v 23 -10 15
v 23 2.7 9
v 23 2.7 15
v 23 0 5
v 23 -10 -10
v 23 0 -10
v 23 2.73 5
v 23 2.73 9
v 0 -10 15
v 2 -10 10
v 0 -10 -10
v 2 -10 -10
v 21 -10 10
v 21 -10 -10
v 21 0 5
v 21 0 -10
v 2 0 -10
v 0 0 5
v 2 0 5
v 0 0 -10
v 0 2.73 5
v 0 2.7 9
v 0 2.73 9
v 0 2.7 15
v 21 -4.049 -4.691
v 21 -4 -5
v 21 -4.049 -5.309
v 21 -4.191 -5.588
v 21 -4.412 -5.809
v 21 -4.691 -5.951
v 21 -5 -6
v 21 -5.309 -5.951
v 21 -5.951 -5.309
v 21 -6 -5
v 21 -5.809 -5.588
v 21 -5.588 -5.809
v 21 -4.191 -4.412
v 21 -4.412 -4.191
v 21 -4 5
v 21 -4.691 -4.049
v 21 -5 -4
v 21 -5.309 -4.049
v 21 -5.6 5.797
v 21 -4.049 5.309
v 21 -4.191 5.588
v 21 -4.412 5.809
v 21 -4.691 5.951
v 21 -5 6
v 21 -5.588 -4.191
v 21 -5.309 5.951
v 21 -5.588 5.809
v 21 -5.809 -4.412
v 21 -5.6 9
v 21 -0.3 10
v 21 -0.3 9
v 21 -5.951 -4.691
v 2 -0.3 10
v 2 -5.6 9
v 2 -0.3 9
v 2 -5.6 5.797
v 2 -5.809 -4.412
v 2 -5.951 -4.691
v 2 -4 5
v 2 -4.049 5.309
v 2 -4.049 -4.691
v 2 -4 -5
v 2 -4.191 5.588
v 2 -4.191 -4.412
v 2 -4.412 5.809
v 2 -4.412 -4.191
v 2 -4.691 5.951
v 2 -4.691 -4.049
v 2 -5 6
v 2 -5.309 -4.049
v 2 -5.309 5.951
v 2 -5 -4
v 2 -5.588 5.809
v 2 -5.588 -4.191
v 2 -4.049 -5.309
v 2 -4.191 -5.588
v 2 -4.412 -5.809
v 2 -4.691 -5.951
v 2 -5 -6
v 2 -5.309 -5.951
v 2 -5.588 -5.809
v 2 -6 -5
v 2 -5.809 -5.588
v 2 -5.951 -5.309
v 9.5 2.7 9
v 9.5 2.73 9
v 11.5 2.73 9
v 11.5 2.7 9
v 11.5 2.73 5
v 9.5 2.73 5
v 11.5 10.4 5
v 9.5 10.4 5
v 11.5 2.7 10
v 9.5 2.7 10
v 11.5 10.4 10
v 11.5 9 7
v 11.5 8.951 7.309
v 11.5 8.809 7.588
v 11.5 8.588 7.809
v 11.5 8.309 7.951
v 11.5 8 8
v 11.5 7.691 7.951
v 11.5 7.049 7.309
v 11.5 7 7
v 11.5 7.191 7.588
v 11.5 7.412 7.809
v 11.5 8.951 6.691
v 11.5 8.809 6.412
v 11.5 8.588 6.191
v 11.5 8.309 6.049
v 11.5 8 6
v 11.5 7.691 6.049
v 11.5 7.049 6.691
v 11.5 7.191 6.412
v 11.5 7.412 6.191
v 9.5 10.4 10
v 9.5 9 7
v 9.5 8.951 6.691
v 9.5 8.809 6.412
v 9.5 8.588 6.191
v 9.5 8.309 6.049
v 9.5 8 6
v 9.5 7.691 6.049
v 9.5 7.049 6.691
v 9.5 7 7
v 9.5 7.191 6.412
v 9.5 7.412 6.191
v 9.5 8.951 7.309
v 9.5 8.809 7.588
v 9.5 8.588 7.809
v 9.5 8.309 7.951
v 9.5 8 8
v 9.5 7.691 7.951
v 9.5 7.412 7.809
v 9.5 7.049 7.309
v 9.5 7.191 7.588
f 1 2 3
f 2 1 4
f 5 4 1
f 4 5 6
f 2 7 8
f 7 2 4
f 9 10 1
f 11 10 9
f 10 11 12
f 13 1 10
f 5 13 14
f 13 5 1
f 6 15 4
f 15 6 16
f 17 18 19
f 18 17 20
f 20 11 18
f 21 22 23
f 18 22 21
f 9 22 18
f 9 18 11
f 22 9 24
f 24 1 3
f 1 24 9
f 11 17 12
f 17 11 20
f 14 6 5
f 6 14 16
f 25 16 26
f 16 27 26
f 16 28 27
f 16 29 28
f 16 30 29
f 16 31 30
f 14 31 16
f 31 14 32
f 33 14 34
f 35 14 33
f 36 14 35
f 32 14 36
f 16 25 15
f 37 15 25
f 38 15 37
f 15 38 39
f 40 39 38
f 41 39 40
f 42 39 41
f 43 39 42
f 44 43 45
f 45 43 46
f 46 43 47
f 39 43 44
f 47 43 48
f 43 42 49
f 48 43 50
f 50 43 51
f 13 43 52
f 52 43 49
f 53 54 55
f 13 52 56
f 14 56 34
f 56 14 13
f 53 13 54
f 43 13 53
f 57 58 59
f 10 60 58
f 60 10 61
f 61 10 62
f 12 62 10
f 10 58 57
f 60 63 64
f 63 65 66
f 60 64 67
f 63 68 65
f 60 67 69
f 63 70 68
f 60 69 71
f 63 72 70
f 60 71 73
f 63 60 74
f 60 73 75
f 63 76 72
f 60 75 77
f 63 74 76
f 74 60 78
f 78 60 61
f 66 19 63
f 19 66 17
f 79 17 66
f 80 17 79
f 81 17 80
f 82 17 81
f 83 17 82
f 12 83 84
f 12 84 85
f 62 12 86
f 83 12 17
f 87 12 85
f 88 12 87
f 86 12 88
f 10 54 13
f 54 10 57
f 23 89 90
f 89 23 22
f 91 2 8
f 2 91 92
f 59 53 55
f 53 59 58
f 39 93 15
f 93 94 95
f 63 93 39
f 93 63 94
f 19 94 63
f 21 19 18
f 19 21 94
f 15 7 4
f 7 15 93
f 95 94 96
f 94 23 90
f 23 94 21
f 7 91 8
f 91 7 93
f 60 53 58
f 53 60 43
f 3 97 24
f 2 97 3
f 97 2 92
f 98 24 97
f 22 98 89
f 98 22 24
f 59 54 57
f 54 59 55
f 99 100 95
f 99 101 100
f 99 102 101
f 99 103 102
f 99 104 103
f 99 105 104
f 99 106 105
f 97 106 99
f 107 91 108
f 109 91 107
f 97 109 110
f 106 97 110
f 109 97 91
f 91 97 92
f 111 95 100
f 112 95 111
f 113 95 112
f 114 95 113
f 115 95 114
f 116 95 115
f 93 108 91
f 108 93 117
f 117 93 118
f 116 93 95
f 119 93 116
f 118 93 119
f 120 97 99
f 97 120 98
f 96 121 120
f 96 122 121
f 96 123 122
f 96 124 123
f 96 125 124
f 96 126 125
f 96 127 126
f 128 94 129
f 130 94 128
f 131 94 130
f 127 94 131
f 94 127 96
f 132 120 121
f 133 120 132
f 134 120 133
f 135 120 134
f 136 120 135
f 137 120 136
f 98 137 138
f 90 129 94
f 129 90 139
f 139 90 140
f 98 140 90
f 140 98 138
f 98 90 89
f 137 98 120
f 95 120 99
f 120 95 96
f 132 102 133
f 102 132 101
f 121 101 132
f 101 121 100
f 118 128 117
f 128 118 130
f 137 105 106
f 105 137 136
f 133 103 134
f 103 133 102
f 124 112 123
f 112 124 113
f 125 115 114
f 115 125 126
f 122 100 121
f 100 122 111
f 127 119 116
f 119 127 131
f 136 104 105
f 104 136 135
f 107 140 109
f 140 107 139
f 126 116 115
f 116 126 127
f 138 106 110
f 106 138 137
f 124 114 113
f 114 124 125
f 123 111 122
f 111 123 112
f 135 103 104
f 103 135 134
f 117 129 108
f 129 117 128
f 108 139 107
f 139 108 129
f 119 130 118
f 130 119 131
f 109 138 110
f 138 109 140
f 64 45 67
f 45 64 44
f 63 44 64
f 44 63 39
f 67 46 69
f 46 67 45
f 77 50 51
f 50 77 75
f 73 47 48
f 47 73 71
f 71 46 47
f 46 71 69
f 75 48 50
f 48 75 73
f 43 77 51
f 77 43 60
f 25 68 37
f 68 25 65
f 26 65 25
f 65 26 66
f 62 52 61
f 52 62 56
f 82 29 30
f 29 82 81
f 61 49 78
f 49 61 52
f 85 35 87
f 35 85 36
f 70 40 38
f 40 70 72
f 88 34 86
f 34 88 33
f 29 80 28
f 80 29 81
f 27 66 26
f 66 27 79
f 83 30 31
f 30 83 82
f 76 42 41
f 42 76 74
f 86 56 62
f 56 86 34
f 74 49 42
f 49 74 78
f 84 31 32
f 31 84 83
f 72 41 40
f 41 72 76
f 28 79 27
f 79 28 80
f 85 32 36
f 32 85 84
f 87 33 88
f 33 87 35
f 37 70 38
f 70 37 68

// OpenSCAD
$fn=20;
translate([0,0,-10])rotate([90,0,0])difference(){
cube([23,25,10]);
translate([2,0,0])cube([19,20,11]);
}
difference(){
difference(){
translate([0,-5.6,5])
union(){
color("green")cube([23,8.33,4]);
translate([0,5.3,4])color("red")cube([23,3,6]);
    translate([9.5,8,0])color("green")color ("red")cube([2,8,5]);
}
translate([6,8,7])rotate([90,0,90])cylinder(6,1,1);
}

translate([0,-5,5])rotate([90,0,90])cylinder(28,1,1);}

translate([0,-5,-5])rotate([90,0,90])cylinder(23,1,1);
